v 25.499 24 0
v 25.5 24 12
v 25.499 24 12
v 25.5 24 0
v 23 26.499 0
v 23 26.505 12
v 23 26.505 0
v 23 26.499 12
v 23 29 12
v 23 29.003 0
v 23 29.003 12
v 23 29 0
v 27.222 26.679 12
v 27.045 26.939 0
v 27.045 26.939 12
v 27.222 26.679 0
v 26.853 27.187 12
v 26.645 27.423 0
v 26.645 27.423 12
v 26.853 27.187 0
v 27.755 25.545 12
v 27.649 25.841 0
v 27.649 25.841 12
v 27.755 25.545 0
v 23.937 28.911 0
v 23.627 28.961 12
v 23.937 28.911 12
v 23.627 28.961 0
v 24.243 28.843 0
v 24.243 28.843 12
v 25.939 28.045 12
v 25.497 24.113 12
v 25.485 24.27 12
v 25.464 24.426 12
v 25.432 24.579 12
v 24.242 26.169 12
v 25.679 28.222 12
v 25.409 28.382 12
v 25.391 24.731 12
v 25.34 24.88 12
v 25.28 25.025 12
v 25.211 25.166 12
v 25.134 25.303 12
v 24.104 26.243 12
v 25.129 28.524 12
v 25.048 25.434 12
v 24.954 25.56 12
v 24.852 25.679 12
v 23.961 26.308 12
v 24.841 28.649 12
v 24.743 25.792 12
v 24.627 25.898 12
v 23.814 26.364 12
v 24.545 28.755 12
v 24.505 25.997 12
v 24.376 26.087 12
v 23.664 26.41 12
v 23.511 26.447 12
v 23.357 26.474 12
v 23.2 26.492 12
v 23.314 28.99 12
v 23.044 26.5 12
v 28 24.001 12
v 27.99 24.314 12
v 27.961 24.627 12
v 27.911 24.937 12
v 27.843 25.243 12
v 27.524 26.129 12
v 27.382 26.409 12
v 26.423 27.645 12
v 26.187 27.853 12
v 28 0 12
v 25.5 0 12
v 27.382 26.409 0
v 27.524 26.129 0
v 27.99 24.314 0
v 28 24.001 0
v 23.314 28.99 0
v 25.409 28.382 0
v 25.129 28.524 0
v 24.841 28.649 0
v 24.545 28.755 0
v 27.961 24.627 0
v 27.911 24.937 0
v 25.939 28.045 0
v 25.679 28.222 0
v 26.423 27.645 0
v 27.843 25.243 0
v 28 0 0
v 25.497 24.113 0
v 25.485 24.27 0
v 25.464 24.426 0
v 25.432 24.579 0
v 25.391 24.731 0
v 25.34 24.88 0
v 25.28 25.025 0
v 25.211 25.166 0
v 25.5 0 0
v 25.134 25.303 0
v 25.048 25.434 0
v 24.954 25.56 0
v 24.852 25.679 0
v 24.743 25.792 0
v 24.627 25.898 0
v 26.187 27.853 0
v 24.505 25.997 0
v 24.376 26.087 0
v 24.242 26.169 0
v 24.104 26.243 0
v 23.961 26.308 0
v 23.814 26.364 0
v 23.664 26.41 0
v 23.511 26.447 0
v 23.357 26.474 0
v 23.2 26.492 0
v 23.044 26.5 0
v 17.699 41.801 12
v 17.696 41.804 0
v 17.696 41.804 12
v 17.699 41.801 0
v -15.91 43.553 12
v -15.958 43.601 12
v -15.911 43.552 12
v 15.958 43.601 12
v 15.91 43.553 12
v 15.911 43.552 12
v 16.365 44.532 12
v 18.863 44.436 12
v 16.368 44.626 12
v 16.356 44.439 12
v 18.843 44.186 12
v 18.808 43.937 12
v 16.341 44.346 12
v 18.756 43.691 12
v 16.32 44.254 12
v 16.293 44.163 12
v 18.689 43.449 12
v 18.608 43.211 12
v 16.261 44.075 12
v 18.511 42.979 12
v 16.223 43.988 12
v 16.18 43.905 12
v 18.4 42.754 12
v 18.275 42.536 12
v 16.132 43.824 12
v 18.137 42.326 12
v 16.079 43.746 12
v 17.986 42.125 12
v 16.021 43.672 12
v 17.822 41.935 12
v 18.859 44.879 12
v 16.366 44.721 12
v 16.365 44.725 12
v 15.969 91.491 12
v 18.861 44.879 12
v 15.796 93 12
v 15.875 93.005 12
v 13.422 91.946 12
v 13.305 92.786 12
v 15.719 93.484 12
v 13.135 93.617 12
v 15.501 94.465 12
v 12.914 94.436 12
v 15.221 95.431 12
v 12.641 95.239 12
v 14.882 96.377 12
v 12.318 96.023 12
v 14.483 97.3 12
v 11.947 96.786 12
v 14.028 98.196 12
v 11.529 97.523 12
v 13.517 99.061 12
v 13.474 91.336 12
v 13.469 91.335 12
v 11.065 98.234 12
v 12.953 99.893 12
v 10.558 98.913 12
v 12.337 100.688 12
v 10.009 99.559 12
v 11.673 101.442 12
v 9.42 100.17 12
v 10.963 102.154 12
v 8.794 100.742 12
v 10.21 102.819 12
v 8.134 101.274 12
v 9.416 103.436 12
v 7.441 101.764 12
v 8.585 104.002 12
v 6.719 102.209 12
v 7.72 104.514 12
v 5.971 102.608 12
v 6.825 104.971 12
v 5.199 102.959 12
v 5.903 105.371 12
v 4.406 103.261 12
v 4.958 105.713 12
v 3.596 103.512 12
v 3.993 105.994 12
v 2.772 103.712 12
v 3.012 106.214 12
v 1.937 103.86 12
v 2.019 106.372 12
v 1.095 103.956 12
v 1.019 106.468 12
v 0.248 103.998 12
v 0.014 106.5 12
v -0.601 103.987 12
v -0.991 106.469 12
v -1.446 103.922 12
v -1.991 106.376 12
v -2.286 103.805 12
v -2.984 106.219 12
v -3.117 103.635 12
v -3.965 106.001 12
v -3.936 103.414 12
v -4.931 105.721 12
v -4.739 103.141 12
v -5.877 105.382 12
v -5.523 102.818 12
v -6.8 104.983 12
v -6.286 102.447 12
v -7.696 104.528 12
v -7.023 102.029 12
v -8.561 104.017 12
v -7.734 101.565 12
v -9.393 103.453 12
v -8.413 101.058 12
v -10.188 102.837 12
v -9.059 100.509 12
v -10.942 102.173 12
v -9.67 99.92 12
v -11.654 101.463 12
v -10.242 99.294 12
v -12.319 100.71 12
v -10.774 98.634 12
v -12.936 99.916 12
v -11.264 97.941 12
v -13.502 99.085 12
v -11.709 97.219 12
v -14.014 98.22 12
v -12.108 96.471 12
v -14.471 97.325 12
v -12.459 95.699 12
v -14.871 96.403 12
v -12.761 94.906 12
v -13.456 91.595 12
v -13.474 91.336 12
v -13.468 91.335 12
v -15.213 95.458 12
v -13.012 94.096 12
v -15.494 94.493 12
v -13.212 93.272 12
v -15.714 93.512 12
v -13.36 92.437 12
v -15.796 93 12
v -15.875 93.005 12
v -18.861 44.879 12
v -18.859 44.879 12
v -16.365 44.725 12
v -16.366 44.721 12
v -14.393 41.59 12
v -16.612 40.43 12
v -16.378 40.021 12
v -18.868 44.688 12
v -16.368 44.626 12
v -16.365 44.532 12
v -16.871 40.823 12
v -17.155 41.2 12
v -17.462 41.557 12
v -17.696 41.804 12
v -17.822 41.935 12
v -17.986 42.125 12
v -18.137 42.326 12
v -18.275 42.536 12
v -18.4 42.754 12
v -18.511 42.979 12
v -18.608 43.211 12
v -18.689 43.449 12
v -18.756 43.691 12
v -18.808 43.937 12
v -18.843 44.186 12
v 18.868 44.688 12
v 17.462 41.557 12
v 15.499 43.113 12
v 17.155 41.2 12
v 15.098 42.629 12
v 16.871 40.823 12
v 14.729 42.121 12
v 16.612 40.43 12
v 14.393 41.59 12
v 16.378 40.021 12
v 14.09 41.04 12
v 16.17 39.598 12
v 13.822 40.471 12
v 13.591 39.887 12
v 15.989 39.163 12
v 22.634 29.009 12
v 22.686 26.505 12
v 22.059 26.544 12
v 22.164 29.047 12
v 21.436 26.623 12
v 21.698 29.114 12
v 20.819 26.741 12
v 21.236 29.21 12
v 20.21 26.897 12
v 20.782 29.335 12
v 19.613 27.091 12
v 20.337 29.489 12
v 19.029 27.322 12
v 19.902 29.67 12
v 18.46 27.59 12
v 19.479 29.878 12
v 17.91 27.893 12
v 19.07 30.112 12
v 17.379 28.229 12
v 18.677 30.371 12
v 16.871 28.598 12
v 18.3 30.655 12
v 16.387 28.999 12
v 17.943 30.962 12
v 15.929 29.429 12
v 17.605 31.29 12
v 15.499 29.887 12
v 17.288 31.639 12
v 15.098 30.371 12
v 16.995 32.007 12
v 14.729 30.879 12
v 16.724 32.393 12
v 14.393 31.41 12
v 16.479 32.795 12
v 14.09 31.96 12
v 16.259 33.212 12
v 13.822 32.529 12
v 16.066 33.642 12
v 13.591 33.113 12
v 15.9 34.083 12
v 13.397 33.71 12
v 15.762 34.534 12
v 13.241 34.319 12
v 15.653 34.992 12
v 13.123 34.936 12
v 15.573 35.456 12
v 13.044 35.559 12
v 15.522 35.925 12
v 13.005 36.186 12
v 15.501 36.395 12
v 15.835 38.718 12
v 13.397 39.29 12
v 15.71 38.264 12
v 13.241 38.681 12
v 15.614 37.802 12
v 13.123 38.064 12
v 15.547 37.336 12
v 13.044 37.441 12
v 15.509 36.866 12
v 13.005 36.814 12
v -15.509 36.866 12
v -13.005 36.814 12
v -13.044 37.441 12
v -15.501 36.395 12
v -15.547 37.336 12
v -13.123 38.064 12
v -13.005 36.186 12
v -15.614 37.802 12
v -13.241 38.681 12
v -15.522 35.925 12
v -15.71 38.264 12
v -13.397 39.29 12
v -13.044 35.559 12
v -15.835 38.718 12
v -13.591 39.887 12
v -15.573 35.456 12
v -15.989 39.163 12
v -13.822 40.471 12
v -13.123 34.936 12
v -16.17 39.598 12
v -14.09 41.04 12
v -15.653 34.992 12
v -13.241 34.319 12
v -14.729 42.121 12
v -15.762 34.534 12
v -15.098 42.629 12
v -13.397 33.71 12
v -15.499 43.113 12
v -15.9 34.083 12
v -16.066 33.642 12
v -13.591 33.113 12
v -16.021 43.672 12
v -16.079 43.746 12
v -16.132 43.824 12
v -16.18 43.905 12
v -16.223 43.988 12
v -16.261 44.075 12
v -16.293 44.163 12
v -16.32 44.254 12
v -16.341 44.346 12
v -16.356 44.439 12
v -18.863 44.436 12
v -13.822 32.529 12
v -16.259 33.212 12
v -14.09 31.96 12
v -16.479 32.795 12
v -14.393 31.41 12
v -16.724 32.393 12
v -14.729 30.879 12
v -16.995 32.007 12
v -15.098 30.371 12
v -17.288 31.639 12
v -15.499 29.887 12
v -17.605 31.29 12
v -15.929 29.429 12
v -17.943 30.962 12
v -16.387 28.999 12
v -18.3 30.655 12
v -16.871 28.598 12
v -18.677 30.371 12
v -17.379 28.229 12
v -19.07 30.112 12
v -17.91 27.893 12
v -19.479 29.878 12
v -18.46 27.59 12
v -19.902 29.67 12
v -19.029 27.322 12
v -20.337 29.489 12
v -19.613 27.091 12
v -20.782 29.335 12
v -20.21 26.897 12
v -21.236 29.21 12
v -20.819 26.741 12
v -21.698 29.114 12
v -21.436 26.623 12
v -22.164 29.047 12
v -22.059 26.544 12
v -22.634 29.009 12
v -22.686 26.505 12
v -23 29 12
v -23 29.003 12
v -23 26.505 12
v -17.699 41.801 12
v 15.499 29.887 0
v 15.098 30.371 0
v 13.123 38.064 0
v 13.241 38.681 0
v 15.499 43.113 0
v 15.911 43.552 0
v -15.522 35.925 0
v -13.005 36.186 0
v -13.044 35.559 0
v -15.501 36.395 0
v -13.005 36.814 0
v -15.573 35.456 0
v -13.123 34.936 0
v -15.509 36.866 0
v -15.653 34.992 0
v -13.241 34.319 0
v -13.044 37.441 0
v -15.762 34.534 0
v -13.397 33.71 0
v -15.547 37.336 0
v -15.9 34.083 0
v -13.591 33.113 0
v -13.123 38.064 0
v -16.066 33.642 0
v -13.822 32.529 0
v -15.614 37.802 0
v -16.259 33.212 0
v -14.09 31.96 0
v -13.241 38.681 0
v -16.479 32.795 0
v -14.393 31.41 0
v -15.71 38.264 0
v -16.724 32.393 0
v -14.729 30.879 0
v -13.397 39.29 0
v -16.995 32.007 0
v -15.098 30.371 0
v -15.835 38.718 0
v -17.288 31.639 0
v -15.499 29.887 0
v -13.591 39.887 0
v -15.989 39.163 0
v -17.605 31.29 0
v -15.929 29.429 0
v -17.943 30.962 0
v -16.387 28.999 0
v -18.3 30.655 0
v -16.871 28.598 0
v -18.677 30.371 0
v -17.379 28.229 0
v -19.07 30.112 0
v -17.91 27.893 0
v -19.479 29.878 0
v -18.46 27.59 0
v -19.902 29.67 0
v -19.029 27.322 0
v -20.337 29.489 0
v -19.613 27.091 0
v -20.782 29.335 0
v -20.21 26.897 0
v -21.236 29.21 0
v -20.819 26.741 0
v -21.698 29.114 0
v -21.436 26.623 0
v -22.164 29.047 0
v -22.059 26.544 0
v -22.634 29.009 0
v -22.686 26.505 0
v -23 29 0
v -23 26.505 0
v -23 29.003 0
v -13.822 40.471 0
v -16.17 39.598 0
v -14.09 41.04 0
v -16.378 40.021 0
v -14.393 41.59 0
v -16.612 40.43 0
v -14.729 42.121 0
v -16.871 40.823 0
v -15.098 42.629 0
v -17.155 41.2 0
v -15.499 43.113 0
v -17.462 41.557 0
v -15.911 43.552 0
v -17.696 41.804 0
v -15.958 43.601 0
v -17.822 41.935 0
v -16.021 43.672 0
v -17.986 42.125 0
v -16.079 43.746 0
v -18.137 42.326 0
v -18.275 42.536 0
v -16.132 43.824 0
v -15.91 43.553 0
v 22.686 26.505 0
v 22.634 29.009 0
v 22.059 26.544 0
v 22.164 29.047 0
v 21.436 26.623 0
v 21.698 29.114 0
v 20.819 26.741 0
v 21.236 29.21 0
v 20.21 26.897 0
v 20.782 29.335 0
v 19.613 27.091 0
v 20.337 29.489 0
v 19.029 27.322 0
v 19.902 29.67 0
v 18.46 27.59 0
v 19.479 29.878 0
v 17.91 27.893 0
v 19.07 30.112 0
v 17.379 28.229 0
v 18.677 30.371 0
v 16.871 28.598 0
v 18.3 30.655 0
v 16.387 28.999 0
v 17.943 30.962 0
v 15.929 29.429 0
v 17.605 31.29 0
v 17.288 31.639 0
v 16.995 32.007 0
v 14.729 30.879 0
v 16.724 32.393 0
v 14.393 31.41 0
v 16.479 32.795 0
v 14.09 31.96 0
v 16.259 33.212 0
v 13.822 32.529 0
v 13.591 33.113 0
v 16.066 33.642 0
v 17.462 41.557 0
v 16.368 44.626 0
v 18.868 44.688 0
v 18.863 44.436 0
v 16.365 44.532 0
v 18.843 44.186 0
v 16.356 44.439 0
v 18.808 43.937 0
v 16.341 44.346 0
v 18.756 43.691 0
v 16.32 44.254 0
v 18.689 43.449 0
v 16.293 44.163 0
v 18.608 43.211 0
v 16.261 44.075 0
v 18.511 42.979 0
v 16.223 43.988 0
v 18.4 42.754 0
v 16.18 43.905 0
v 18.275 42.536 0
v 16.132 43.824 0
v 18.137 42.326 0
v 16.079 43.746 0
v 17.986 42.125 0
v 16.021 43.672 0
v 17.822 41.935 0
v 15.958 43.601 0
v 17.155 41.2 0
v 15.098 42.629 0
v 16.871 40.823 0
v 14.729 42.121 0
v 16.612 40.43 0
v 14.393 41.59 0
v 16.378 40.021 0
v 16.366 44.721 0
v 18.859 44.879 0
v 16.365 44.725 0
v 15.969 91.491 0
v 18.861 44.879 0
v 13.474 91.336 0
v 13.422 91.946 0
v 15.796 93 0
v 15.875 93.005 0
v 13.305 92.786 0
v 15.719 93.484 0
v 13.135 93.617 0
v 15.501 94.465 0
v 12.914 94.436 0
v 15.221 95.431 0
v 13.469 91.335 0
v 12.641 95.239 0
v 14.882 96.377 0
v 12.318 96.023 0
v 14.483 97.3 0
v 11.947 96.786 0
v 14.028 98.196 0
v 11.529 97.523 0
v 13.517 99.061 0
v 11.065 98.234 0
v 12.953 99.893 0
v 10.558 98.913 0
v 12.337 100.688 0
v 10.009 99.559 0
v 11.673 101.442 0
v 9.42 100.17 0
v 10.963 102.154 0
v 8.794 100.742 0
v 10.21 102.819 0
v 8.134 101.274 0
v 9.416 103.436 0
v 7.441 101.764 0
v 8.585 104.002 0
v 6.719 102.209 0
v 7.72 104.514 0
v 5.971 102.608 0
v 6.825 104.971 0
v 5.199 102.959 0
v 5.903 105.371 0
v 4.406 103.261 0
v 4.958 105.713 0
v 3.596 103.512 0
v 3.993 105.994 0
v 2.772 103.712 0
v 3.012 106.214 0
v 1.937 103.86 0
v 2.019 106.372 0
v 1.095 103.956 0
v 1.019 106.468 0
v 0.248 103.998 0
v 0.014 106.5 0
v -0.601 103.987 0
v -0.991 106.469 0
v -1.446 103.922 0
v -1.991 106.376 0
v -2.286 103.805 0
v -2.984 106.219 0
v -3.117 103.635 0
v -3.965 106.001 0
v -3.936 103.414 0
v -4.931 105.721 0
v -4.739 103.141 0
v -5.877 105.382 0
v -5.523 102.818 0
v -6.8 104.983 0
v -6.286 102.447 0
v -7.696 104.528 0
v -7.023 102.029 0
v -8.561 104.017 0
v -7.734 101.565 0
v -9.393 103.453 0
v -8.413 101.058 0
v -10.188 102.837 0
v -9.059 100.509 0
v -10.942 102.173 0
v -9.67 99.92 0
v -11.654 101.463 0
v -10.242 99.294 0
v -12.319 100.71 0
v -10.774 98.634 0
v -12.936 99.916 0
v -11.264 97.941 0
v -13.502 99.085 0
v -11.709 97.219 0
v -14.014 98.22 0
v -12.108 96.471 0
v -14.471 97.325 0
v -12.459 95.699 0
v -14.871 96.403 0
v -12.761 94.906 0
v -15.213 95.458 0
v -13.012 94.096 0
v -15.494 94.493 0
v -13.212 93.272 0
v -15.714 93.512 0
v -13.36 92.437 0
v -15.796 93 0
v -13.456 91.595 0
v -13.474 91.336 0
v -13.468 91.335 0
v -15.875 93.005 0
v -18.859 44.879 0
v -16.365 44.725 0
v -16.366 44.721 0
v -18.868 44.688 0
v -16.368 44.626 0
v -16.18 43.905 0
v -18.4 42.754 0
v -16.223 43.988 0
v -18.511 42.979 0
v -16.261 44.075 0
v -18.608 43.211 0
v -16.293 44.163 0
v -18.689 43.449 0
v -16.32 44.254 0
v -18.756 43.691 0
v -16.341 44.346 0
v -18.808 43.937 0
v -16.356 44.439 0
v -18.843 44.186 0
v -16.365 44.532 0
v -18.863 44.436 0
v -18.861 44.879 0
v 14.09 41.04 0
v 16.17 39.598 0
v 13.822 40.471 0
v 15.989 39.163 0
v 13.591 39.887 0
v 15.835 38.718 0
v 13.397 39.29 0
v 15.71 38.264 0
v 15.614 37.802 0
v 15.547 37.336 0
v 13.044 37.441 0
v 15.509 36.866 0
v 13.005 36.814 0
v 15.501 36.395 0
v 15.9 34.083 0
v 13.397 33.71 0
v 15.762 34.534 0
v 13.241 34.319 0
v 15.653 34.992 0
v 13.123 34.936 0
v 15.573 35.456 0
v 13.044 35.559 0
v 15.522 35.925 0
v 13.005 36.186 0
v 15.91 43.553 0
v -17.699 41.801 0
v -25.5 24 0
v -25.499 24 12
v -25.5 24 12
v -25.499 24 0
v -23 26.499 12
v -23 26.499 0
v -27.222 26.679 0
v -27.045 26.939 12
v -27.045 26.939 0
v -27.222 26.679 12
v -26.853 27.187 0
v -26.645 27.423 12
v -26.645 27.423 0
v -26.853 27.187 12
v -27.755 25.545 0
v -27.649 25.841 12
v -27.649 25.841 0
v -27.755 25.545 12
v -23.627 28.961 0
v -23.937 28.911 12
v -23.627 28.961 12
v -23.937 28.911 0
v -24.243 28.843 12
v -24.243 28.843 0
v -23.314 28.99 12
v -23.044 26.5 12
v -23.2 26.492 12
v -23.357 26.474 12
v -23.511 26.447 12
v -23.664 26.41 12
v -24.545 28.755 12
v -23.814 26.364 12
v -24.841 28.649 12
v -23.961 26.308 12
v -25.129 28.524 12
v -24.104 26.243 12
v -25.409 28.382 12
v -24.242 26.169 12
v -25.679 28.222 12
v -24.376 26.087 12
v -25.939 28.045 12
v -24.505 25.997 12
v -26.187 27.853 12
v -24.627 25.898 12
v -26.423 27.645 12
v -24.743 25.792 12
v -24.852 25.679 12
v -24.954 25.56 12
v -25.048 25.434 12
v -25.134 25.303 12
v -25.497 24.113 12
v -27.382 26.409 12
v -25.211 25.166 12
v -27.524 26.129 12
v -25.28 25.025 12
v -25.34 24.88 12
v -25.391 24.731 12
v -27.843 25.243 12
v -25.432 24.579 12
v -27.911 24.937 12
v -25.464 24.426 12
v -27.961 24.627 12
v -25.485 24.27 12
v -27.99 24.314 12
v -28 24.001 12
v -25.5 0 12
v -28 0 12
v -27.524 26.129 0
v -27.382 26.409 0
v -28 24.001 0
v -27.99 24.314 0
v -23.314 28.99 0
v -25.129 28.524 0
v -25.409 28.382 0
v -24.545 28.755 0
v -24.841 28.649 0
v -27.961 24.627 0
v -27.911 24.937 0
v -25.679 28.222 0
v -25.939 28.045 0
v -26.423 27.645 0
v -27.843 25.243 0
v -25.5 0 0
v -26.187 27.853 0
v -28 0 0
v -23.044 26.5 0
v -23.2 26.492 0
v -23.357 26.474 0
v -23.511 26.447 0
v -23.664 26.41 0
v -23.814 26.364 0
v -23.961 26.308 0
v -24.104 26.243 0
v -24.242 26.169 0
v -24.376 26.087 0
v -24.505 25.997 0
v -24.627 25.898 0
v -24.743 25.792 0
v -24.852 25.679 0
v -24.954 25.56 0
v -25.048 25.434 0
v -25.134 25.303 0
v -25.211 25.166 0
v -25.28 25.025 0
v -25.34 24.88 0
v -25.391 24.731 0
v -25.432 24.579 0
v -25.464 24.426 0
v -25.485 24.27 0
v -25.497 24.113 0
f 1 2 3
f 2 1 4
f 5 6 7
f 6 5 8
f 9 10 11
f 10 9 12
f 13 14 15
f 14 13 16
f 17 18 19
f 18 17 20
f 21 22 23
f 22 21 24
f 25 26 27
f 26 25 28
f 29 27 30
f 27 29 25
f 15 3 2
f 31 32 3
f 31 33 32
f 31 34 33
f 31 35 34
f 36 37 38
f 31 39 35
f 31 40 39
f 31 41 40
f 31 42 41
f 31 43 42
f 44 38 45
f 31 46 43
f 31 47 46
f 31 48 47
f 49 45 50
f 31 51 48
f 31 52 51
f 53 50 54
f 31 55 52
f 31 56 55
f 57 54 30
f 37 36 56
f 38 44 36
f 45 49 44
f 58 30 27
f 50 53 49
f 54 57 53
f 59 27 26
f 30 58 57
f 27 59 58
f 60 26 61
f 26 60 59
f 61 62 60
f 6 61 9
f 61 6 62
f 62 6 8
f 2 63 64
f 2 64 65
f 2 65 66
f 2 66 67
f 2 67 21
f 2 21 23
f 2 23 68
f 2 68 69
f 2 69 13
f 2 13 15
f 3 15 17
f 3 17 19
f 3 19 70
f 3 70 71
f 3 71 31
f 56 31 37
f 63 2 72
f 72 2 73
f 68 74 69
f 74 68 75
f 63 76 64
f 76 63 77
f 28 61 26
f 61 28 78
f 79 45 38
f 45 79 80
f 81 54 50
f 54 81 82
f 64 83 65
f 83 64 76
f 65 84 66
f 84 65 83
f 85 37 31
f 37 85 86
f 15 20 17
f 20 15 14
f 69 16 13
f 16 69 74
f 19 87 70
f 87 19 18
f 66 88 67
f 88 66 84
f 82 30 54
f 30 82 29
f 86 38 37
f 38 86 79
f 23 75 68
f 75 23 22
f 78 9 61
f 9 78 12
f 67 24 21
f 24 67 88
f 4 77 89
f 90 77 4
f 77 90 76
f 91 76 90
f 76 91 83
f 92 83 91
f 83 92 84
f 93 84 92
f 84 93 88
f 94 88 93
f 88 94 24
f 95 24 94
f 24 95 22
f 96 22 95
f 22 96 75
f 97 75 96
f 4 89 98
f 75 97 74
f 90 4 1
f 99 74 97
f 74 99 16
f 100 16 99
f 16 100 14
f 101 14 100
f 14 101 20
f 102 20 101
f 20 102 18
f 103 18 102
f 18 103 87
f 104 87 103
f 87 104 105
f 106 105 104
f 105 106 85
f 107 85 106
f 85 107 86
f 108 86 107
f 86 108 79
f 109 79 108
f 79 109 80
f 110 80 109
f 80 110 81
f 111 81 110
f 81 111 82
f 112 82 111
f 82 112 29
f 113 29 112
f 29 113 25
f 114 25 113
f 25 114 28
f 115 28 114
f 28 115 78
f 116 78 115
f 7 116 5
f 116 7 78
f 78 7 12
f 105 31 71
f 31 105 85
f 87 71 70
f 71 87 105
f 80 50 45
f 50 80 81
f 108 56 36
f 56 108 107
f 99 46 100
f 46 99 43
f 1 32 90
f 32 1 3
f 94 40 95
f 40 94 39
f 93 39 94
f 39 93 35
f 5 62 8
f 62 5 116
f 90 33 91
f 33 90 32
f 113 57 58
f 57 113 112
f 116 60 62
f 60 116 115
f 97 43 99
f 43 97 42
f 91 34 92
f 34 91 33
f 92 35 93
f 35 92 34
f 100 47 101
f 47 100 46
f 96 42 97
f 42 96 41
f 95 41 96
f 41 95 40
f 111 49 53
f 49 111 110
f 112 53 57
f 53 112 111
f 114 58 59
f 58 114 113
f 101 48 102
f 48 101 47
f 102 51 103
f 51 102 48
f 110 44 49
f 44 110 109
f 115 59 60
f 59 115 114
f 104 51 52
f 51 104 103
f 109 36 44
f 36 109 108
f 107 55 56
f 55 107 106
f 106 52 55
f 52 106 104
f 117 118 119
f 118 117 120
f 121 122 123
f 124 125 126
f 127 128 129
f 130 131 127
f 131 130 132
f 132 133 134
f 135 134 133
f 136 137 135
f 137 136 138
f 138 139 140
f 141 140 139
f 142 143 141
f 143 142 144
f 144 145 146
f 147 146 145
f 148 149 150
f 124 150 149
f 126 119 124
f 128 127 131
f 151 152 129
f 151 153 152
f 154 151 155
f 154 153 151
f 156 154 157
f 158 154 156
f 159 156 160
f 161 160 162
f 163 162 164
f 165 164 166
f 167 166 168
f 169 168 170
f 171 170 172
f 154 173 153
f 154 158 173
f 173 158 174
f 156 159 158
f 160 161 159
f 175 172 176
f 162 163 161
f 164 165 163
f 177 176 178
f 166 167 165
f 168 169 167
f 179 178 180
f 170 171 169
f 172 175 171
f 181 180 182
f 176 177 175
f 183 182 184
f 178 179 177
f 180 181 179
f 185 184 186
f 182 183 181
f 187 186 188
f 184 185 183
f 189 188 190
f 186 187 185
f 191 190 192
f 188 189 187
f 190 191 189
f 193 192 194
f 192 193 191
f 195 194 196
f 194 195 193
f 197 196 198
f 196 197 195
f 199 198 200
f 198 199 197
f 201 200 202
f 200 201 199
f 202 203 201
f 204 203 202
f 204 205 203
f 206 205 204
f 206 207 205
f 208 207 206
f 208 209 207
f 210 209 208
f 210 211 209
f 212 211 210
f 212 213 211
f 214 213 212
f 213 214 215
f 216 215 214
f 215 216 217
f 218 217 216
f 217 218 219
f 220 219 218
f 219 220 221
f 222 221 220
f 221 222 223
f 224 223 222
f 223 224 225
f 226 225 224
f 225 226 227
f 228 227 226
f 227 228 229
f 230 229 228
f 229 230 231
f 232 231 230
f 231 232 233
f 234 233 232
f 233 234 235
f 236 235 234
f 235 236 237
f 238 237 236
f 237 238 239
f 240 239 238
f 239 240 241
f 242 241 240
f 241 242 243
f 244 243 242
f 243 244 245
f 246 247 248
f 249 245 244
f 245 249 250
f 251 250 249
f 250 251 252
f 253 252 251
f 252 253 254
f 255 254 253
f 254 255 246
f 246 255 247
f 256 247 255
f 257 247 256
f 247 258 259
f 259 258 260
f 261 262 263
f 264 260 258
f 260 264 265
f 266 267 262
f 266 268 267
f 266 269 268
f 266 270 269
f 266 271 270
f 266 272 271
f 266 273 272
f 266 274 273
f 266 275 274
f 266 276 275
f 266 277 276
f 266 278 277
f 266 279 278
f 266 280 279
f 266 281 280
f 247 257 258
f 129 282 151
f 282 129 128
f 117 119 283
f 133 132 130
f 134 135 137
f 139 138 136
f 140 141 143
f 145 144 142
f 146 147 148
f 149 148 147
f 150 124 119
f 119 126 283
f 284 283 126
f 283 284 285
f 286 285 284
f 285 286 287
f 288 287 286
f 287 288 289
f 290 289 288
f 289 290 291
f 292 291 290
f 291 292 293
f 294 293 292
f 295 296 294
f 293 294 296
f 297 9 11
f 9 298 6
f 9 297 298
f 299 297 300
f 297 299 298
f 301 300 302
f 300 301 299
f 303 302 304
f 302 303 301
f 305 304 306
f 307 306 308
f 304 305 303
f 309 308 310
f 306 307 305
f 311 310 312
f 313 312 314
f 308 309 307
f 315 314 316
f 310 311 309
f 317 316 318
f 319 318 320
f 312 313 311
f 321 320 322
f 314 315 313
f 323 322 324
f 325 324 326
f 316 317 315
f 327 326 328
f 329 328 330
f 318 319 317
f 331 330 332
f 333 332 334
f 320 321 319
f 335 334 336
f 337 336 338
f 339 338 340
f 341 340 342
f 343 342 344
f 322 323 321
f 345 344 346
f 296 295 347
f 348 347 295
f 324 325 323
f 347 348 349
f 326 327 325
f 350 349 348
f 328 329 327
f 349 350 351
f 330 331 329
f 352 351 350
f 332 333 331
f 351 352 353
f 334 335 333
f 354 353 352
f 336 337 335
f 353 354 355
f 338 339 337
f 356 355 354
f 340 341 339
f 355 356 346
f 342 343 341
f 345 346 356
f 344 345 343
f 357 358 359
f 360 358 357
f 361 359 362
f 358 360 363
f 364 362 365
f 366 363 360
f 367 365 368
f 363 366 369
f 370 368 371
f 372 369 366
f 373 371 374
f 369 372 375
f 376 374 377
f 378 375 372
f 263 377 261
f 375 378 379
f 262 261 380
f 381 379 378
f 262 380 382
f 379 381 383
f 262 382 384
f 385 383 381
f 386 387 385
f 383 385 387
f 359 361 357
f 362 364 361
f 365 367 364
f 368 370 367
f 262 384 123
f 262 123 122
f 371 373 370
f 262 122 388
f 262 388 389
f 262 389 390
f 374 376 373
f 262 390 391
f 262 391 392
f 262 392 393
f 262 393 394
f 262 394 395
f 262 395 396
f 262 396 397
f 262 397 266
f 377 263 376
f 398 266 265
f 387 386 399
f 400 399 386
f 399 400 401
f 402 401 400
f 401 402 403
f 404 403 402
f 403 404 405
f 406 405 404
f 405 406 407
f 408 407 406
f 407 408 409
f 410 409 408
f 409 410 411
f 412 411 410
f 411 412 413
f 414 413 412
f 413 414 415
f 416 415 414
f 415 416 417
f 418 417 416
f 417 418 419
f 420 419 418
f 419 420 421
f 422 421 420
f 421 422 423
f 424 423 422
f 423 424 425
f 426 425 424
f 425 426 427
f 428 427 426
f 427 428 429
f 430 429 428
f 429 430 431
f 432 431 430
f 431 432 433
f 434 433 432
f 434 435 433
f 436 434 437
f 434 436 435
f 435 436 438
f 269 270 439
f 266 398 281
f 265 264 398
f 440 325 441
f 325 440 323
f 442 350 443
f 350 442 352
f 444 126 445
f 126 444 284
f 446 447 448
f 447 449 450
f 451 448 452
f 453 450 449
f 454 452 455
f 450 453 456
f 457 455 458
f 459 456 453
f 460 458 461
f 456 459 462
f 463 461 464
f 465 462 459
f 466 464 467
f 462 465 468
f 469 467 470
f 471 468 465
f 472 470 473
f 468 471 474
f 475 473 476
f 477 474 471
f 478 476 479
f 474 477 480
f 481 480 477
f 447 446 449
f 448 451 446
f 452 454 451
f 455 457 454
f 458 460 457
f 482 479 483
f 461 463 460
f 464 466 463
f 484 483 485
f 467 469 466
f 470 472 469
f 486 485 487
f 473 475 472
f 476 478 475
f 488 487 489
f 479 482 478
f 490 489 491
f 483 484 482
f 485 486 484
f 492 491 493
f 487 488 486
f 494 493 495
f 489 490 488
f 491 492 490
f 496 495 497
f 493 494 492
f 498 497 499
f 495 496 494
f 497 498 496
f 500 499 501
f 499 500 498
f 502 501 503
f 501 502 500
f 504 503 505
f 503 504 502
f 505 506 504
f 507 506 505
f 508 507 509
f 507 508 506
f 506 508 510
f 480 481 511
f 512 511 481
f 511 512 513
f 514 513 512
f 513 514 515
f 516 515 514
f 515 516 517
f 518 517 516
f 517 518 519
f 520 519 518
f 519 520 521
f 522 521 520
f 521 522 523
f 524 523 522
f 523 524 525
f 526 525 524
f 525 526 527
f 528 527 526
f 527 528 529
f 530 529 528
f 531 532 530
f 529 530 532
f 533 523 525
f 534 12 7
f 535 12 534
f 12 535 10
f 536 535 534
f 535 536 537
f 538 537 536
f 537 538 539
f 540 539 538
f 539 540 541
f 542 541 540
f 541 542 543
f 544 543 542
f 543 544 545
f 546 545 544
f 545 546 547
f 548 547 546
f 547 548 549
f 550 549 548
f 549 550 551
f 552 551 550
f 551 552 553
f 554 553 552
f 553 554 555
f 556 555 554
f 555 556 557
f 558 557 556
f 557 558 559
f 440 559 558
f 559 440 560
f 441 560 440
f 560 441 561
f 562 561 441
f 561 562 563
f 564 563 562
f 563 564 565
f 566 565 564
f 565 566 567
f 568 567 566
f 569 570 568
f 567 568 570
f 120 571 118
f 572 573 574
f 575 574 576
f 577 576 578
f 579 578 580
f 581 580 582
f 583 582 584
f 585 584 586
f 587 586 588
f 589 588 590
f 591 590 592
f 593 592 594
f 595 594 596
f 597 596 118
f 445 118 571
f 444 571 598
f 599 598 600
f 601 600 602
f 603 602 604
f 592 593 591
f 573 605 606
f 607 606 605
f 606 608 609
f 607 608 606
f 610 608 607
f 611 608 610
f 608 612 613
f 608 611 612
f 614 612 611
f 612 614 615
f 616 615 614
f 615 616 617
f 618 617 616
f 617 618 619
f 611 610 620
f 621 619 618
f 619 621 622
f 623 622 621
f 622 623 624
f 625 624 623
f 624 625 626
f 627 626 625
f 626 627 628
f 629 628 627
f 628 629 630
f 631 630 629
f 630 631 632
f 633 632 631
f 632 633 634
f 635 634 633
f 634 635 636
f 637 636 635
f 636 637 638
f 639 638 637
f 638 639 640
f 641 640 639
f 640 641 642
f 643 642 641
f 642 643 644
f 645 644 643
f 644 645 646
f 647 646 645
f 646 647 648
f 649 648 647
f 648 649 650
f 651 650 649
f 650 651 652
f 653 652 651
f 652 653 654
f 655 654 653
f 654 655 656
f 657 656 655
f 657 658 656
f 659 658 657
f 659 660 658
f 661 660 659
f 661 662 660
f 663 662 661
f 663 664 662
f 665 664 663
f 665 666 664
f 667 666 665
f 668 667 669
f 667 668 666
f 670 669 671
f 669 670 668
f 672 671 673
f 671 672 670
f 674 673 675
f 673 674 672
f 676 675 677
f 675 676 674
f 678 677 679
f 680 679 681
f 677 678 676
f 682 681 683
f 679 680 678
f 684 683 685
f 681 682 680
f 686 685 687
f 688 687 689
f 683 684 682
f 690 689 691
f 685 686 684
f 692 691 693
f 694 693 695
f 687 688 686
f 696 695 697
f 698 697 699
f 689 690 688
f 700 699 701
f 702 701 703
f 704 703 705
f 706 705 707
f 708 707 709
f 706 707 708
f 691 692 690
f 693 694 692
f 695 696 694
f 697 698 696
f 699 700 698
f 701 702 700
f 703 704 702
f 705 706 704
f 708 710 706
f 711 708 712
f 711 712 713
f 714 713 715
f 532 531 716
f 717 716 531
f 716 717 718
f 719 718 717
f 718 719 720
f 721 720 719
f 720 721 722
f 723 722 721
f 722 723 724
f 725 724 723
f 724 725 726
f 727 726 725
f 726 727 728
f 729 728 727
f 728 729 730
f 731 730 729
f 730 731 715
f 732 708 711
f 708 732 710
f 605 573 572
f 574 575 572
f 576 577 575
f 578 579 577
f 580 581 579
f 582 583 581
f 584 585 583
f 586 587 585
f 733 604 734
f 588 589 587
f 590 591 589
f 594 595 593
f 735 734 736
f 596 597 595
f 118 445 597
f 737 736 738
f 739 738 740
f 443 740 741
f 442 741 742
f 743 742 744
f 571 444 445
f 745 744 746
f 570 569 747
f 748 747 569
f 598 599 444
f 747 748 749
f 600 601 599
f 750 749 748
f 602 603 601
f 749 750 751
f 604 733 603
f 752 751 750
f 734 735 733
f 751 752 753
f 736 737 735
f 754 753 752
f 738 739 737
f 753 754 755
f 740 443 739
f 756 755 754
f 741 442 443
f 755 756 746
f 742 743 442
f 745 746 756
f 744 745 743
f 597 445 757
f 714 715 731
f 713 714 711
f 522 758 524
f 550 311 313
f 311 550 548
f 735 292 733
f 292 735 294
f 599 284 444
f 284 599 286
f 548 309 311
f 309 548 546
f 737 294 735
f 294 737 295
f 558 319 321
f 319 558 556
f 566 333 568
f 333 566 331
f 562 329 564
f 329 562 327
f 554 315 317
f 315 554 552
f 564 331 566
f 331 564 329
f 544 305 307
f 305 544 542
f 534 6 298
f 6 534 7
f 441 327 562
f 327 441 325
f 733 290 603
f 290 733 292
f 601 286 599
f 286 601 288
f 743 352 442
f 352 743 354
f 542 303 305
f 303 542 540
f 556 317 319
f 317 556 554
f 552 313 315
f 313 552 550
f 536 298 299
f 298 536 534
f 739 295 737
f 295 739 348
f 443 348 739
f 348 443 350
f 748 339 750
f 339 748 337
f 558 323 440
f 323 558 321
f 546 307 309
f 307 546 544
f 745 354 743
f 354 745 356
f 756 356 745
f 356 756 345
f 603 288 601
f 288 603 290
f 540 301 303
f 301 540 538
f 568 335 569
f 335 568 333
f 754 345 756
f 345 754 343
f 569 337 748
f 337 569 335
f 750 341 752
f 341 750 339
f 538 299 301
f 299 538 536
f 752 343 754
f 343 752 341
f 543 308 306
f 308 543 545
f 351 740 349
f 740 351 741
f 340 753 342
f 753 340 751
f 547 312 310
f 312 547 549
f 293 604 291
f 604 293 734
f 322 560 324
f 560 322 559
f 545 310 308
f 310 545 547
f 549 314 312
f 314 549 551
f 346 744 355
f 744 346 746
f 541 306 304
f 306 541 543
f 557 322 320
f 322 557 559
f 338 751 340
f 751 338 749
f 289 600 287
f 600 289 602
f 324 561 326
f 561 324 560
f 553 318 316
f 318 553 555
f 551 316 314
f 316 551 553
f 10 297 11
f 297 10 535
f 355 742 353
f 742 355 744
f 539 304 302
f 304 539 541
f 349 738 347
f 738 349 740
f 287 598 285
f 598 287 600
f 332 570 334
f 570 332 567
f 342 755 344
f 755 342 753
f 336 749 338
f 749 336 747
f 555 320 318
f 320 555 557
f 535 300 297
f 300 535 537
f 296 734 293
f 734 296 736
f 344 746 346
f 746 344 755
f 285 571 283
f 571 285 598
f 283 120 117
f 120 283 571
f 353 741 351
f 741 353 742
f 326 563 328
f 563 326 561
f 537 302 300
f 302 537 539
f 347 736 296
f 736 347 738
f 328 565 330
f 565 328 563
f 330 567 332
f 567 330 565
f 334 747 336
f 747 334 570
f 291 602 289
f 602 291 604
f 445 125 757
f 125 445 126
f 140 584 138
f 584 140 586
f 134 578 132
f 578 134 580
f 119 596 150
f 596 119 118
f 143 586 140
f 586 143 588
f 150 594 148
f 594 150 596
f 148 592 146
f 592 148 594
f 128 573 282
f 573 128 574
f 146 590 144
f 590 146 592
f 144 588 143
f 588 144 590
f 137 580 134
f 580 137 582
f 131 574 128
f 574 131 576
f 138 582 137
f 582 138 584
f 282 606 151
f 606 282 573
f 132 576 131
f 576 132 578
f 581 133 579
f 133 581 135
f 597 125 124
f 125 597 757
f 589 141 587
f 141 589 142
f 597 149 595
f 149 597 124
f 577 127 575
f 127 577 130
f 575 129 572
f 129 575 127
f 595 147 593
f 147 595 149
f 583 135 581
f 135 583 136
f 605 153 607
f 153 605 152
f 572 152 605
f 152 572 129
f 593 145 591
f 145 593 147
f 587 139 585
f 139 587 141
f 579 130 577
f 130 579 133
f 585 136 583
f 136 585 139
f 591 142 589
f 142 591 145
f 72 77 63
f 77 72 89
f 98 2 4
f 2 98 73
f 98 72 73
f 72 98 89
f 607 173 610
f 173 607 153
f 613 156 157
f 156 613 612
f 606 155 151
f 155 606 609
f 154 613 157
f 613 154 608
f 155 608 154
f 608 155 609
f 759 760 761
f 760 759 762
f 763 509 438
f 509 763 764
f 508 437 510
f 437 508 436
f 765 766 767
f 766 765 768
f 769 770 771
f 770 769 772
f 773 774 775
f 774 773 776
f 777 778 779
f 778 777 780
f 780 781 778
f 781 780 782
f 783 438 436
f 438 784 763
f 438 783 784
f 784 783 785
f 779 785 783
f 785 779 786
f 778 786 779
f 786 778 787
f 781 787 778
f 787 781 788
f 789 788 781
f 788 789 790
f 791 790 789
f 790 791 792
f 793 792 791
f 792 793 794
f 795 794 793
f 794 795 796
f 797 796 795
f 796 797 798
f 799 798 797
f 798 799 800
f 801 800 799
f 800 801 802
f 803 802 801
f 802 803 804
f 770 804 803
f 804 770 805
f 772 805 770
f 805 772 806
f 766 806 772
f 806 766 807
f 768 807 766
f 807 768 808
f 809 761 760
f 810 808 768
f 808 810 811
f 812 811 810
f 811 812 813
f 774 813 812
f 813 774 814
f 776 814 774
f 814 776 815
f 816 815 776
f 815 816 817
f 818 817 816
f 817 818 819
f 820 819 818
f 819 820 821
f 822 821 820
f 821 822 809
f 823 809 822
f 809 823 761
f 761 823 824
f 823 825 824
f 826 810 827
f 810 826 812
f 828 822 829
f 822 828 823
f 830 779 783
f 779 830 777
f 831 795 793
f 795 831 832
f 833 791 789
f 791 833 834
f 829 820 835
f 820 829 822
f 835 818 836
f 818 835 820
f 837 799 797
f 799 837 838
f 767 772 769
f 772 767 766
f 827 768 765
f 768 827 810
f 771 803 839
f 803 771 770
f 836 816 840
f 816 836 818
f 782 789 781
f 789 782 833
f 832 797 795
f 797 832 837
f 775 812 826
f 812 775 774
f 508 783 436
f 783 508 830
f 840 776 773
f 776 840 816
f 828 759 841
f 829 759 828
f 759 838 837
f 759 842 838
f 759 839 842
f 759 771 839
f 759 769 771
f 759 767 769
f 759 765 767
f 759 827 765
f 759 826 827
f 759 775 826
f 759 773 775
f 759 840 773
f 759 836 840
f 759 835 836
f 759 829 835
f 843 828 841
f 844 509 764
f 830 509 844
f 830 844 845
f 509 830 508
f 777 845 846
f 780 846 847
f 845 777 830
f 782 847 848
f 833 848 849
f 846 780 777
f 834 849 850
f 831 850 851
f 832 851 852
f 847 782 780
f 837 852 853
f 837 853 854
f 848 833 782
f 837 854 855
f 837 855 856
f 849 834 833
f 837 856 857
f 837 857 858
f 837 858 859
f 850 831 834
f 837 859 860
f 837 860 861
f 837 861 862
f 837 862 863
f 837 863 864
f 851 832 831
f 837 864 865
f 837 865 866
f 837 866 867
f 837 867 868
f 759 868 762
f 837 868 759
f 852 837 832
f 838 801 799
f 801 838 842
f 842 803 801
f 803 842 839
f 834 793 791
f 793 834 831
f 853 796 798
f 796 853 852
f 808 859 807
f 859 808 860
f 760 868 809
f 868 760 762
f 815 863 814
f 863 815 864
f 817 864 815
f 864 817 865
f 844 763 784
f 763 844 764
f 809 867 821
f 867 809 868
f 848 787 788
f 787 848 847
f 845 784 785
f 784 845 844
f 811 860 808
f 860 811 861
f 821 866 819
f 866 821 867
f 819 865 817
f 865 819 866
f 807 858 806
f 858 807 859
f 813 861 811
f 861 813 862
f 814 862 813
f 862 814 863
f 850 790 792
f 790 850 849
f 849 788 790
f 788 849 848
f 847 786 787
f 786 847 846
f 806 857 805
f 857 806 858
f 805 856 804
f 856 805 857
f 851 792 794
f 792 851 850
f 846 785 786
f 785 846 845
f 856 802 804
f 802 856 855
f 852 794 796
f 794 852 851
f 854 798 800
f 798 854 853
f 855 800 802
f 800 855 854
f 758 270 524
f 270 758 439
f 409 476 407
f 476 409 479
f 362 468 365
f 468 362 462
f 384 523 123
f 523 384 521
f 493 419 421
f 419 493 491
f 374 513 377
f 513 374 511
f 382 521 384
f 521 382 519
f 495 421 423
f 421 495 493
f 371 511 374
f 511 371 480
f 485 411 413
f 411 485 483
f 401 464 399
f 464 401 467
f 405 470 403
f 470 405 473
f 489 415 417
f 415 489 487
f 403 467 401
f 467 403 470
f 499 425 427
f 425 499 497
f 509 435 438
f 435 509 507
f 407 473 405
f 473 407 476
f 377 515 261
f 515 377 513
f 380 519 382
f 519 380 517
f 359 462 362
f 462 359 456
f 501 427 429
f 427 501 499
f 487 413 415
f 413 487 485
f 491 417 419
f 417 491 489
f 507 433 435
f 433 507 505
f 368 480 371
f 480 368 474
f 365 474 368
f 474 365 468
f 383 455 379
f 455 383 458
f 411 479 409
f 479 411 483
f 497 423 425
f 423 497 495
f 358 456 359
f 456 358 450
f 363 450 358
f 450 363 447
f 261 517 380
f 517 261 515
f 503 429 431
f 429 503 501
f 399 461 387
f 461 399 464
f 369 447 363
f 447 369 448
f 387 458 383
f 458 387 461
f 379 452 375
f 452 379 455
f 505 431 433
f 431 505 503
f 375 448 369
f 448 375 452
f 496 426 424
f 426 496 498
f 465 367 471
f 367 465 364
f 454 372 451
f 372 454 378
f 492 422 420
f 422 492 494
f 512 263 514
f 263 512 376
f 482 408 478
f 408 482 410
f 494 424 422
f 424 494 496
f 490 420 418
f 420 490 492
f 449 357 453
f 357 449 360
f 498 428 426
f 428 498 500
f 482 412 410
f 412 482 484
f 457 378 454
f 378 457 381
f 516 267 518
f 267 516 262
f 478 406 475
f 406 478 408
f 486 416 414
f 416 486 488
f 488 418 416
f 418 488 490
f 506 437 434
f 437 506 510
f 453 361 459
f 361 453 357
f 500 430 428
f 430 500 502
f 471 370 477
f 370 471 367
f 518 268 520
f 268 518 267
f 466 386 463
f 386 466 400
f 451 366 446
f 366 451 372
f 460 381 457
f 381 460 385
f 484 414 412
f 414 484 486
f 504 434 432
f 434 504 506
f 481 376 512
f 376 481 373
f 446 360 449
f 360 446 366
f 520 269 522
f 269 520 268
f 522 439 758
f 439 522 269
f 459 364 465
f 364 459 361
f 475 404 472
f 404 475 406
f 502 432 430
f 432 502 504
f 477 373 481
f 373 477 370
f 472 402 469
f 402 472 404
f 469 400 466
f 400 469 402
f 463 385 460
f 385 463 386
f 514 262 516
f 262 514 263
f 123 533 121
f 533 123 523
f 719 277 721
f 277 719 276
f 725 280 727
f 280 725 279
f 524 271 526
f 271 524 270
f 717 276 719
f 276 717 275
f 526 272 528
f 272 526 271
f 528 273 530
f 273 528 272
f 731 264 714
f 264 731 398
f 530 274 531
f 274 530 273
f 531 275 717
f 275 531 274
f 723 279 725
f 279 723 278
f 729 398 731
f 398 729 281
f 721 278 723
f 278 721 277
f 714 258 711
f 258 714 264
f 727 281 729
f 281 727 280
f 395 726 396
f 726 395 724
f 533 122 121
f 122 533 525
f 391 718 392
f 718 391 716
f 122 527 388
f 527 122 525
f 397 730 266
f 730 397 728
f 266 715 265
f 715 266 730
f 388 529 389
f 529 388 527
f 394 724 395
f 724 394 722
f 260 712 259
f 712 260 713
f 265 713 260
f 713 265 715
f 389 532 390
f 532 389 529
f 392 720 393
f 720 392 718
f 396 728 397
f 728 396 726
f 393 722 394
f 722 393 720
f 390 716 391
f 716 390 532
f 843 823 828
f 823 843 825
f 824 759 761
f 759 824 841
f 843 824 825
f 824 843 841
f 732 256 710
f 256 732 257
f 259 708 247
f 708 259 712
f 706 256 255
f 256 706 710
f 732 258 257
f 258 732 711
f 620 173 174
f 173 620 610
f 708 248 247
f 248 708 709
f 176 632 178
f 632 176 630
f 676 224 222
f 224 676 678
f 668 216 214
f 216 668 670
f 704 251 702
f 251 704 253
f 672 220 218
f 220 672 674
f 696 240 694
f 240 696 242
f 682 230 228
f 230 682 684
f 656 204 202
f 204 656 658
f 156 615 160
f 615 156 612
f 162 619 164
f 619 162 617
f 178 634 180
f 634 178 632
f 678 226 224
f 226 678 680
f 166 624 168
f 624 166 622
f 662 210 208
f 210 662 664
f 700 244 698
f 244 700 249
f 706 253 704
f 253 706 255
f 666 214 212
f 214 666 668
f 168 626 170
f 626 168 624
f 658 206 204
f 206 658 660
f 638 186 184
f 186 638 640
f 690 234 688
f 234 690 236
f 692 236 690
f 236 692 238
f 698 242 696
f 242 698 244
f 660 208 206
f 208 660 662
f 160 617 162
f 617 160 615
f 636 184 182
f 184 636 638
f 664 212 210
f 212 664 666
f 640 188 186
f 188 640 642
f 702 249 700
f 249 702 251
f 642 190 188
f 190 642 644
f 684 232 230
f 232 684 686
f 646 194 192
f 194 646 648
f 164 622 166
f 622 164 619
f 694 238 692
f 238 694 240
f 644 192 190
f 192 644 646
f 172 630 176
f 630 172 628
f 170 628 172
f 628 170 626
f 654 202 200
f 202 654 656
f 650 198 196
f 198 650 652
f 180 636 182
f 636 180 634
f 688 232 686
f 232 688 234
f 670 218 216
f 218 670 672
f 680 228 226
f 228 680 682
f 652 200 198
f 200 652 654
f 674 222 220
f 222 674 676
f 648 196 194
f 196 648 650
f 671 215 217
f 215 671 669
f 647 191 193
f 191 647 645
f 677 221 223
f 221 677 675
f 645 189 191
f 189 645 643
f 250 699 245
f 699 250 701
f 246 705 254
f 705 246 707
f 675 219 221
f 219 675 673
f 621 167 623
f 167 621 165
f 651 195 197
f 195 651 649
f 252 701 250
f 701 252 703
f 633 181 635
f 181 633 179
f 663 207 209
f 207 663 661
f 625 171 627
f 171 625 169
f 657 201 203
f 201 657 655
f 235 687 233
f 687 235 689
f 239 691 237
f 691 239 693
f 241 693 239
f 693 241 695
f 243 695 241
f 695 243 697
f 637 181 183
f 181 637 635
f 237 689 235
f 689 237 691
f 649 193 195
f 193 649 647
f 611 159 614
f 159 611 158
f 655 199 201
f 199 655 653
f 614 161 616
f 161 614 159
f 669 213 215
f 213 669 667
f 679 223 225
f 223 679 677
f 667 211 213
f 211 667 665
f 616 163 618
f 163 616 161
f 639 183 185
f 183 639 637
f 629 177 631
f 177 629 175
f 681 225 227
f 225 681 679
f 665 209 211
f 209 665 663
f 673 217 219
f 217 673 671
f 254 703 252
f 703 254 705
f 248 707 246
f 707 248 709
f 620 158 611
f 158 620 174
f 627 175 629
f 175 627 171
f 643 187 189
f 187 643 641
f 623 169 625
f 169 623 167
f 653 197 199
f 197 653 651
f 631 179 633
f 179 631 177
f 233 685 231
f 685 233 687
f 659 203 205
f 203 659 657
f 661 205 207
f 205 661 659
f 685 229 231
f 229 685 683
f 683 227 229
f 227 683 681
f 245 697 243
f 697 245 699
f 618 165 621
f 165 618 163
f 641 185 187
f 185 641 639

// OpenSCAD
// Peeler (e.g. for potatoes)
$fn = 100;

e = 0.001;

// starts at y axis + a1 in clock direction, continues for a2.
module arc (a1, a2, r, fw, h)
{
    rotate ([0, 0, a1])
    {
        difference () {
            slice (r, h, a2);
            rotate ([0, 0, -1])
                translate ([0, 0, -h])
                    slice (r - fw, 3 * h, a2 + 2);
        }
    }
}

// Starts at Y-axis in negative clock direction
module slice (r = 10, h = 10, ang = 30) {
    aa = (ang % 360 > 0) ? ang % 360 : ang % 360 + 360;
    rotate (-90) {
        difference() {
            cylinder (r = r, h = h);
            if (aa > 180)
                intersection_for (a = [0, 180 - aa])
                    rotate(-a) translate([-r, 0, -h])
                        cube ([r * 2, r * 2, 3 * h]);
            else union() for (a = [0, 180 - aa])
                rotate(-a) translate([-r, 0, -h])
                    cube ([r * 2, r * 2, 3 * h]);
        }
    }
}

module peelerside (fw, bw, bd, h, r1, r2, c2x, c2y, rg, cgx, cgy, ga, sx, sy, c3x, c3y, cta)
{
    translate ([bw / 2, 0, 0])
        cube ([fw, bd + e, h]);
    translate ([bw / 2 - r1 + fw, bd, 0])
        arc (-90, 90, r1, fw, h);
    translate ([cgx, cgy, 0])
        arc (45, 90 + 45, rg, fw, h);
    translate ([c2x, c2y, 0])
        arc (180 + 45 - 1, ga + 1, r2, fw, h);
    translate ([sx, sy, 0]) rotate ([0, 0, cta])
        cube ([fw, sqrt (pow ((c2x - c3x), 2) + pow (c2y - c3y, 2)), h]);
}

// fw: feature width
// bw: width of peeler blade (inner peeler width)
// bd: depth of blade space
// h: height
// dg: dia of grip
// ed: distance to lower end from middle
// d1: dia of 1st rounded corner
// d2: dia of 2nd rounded corner
// d3: dia of lower round end
// db: dia of blade holder
// dh: dia of blade hole
// 
module peeler (fw, bw, bd, h, dg, ed, d1, d2, d3, db, dh)
{
    r1 = d1 / 2;
    r2 = d2 / 2;
    rg = dg / 2;
    r3 = d3 / 2;
    cgx = (bw / 2) - r1 + fw;
    cgy = bd + rg + fw;
    c2x = -r2 * sin (45) + (bw / 2) - (r1 - fw) - (rg - fw) * sin (45);
    c2y =  r2 * sin (45) + bd + r1 + (rg - fw) + (rg - fw) * sin (45);
    c3x = 0;
    c3y = cgy + ed - r3;
    dc2c3 = sqrt (pow (c2x - c3x, 2) + pow (c2y - c3y, 2));
    ca = asin ((c2x - c3x) / dc2c3);
    ta = asin ((r2 - r3) / dc2c3);
    cta = ca + ta;
    ga = 45 + cta;
    a3  = 180 - 2 * cta;
    sx = c2x + (r2 - fw) * cos (cta);
    sy = c2y + (r2 - fw) * sin (cta);
    peelerside (fw, bw, bd, h, r1, r2, c2x, c2y, rg, cgx, cgy, ga, sx, sy, c3x, c3y, cta);
    mirror ([1, 0, 0])
    peelerside (fw, bw, bd, h, r1, r2, c2x, c2y, rg, cgx, cgy, ga, sx, sy, c3x, c3y, cta);
    translate ([0, c3y, 0])
        arc (-a3 / 2, a3, r3, fw, h);

}

//slice (10, 10, 230);
//arc (10, 230, 10, 2, 10);
peeler (2.5, 51, 24, 12, 20, 70, 10, 8, 32, 3, 3.5);
